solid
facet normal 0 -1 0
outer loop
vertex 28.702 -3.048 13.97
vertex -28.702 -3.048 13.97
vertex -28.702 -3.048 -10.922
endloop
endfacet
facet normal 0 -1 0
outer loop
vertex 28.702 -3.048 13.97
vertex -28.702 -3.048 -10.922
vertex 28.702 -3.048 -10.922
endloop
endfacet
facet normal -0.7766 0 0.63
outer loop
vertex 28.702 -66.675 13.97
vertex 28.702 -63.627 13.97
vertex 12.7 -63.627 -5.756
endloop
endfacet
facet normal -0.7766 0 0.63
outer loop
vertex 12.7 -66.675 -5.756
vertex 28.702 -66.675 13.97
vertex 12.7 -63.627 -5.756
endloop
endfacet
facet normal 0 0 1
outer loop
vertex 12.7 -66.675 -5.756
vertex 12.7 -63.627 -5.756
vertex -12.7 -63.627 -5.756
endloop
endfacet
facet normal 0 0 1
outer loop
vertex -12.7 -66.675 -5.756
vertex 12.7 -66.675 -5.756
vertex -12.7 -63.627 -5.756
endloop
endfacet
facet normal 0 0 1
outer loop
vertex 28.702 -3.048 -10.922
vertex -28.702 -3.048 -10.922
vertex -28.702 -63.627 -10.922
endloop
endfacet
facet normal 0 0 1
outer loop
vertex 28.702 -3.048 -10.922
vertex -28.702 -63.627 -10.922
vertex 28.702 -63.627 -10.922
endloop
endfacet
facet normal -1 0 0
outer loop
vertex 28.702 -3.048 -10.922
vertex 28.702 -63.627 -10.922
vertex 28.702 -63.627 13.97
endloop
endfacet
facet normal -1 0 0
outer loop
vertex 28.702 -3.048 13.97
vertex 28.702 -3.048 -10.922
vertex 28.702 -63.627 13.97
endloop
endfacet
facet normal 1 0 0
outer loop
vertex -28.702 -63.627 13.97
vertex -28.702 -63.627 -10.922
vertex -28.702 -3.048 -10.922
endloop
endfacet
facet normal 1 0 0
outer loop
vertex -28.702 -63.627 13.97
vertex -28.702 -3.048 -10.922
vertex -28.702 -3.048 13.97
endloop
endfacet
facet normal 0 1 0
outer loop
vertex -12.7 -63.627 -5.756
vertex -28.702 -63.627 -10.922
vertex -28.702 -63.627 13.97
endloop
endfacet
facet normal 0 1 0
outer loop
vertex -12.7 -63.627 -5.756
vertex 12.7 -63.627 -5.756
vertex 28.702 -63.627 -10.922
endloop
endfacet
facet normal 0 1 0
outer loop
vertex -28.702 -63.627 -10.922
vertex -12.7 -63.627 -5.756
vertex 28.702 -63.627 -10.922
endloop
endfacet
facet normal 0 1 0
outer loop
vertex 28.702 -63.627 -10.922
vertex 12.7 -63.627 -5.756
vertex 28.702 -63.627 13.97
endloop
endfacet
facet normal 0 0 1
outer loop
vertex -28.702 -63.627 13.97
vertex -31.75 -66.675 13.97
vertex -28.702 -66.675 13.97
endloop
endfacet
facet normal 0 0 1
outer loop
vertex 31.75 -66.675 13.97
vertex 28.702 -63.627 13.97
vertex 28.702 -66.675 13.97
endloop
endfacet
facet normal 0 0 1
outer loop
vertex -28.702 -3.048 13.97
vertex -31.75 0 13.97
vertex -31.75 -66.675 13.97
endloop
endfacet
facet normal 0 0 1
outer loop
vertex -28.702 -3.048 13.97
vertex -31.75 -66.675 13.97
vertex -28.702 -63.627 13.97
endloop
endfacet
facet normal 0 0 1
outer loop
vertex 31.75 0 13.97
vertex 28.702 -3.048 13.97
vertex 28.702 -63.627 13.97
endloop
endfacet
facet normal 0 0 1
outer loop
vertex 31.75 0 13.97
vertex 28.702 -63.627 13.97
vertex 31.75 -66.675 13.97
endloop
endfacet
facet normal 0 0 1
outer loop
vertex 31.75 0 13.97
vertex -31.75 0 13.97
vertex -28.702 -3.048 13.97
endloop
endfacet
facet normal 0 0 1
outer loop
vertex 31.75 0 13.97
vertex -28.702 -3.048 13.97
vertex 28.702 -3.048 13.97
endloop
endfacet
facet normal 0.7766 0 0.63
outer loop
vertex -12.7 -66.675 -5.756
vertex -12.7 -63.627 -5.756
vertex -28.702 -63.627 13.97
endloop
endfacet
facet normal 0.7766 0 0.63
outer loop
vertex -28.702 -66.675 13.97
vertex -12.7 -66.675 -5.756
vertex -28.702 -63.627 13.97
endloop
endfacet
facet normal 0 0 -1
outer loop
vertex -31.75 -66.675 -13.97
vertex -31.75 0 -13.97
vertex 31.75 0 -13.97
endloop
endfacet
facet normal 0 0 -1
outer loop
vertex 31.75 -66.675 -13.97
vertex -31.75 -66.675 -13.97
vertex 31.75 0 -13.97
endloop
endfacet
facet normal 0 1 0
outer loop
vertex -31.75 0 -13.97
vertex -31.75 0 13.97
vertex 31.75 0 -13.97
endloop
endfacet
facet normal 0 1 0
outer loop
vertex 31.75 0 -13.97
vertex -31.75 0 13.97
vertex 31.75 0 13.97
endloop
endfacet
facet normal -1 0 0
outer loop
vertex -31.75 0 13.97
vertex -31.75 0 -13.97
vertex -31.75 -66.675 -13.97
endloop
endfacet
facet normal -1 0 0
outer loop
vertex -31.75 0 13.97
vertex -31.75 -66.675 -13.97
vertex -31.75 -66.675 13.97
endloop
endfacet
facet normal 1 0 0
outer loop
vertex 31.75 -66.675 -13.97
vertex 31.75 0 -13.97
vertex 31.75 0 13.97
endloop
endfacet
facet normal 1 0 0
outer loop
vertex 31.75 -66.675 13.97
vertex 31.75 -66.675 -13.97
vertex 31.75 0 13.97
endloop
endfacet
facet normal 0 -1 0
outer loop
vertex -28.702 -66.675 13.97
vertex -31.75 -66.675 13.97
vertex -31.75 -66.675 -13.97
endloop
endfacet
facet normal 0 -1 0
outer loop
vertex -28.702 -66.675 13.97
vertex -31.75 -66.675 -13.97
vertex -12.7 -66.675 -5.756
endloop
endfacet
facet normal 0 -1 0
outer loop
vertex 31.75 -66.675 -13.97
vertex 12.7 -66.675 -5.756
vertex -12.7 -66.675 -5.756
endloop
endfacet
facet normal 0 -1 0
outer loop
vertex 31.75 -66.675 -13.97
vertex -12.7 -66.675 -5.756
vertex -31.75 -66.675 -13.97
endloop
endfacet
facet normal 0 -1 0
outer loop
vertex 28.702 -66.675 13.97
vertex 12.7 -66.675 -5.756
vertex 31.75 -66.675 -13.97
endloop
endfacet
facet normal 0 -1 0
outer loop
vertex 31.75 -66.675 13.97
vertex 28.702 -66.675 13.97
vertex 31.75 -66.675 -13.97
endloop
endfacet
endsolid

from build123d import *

# Parameters (mm, degrees)
F0_W     = 63.5
F0_H     = 27.94
F1_DEPTH = 66.675
F2_T     = -3.048
F4_DEPTH = 25.4


with BuildPart() as f1:
    # F0 (on Front) → F1 (new body)
    with BuildSketch(Plane.XZ):
        Rectangle(F0_W, F0_H)
    extrude(amount=F1_DEPTH)

    # F2
    f2_openings = [f1.faces().sort_by_distance(p)[0] for p in [
        (0, -33.3375, 13.97),
    ]]
    offset(amount=F2_T, openings=f2_openings)

    # F3 (on face) → F4 (cut)
    with BuildSketch(Plane(origin=(0, -63.627, 0), x_dir=(-1, 0, 0), z_dir=(0, 1, 0))):
        Polygon((12.7, -5.7555163684), (28.702, 13.97), (-28.702, 13.97), (-12.7, -5.7555163684), (0, -5.7555163684), align=None)
    extrude(amount=-F4_DEPTH, mode=Mode.SUBTRACT)


solid = f1.part
